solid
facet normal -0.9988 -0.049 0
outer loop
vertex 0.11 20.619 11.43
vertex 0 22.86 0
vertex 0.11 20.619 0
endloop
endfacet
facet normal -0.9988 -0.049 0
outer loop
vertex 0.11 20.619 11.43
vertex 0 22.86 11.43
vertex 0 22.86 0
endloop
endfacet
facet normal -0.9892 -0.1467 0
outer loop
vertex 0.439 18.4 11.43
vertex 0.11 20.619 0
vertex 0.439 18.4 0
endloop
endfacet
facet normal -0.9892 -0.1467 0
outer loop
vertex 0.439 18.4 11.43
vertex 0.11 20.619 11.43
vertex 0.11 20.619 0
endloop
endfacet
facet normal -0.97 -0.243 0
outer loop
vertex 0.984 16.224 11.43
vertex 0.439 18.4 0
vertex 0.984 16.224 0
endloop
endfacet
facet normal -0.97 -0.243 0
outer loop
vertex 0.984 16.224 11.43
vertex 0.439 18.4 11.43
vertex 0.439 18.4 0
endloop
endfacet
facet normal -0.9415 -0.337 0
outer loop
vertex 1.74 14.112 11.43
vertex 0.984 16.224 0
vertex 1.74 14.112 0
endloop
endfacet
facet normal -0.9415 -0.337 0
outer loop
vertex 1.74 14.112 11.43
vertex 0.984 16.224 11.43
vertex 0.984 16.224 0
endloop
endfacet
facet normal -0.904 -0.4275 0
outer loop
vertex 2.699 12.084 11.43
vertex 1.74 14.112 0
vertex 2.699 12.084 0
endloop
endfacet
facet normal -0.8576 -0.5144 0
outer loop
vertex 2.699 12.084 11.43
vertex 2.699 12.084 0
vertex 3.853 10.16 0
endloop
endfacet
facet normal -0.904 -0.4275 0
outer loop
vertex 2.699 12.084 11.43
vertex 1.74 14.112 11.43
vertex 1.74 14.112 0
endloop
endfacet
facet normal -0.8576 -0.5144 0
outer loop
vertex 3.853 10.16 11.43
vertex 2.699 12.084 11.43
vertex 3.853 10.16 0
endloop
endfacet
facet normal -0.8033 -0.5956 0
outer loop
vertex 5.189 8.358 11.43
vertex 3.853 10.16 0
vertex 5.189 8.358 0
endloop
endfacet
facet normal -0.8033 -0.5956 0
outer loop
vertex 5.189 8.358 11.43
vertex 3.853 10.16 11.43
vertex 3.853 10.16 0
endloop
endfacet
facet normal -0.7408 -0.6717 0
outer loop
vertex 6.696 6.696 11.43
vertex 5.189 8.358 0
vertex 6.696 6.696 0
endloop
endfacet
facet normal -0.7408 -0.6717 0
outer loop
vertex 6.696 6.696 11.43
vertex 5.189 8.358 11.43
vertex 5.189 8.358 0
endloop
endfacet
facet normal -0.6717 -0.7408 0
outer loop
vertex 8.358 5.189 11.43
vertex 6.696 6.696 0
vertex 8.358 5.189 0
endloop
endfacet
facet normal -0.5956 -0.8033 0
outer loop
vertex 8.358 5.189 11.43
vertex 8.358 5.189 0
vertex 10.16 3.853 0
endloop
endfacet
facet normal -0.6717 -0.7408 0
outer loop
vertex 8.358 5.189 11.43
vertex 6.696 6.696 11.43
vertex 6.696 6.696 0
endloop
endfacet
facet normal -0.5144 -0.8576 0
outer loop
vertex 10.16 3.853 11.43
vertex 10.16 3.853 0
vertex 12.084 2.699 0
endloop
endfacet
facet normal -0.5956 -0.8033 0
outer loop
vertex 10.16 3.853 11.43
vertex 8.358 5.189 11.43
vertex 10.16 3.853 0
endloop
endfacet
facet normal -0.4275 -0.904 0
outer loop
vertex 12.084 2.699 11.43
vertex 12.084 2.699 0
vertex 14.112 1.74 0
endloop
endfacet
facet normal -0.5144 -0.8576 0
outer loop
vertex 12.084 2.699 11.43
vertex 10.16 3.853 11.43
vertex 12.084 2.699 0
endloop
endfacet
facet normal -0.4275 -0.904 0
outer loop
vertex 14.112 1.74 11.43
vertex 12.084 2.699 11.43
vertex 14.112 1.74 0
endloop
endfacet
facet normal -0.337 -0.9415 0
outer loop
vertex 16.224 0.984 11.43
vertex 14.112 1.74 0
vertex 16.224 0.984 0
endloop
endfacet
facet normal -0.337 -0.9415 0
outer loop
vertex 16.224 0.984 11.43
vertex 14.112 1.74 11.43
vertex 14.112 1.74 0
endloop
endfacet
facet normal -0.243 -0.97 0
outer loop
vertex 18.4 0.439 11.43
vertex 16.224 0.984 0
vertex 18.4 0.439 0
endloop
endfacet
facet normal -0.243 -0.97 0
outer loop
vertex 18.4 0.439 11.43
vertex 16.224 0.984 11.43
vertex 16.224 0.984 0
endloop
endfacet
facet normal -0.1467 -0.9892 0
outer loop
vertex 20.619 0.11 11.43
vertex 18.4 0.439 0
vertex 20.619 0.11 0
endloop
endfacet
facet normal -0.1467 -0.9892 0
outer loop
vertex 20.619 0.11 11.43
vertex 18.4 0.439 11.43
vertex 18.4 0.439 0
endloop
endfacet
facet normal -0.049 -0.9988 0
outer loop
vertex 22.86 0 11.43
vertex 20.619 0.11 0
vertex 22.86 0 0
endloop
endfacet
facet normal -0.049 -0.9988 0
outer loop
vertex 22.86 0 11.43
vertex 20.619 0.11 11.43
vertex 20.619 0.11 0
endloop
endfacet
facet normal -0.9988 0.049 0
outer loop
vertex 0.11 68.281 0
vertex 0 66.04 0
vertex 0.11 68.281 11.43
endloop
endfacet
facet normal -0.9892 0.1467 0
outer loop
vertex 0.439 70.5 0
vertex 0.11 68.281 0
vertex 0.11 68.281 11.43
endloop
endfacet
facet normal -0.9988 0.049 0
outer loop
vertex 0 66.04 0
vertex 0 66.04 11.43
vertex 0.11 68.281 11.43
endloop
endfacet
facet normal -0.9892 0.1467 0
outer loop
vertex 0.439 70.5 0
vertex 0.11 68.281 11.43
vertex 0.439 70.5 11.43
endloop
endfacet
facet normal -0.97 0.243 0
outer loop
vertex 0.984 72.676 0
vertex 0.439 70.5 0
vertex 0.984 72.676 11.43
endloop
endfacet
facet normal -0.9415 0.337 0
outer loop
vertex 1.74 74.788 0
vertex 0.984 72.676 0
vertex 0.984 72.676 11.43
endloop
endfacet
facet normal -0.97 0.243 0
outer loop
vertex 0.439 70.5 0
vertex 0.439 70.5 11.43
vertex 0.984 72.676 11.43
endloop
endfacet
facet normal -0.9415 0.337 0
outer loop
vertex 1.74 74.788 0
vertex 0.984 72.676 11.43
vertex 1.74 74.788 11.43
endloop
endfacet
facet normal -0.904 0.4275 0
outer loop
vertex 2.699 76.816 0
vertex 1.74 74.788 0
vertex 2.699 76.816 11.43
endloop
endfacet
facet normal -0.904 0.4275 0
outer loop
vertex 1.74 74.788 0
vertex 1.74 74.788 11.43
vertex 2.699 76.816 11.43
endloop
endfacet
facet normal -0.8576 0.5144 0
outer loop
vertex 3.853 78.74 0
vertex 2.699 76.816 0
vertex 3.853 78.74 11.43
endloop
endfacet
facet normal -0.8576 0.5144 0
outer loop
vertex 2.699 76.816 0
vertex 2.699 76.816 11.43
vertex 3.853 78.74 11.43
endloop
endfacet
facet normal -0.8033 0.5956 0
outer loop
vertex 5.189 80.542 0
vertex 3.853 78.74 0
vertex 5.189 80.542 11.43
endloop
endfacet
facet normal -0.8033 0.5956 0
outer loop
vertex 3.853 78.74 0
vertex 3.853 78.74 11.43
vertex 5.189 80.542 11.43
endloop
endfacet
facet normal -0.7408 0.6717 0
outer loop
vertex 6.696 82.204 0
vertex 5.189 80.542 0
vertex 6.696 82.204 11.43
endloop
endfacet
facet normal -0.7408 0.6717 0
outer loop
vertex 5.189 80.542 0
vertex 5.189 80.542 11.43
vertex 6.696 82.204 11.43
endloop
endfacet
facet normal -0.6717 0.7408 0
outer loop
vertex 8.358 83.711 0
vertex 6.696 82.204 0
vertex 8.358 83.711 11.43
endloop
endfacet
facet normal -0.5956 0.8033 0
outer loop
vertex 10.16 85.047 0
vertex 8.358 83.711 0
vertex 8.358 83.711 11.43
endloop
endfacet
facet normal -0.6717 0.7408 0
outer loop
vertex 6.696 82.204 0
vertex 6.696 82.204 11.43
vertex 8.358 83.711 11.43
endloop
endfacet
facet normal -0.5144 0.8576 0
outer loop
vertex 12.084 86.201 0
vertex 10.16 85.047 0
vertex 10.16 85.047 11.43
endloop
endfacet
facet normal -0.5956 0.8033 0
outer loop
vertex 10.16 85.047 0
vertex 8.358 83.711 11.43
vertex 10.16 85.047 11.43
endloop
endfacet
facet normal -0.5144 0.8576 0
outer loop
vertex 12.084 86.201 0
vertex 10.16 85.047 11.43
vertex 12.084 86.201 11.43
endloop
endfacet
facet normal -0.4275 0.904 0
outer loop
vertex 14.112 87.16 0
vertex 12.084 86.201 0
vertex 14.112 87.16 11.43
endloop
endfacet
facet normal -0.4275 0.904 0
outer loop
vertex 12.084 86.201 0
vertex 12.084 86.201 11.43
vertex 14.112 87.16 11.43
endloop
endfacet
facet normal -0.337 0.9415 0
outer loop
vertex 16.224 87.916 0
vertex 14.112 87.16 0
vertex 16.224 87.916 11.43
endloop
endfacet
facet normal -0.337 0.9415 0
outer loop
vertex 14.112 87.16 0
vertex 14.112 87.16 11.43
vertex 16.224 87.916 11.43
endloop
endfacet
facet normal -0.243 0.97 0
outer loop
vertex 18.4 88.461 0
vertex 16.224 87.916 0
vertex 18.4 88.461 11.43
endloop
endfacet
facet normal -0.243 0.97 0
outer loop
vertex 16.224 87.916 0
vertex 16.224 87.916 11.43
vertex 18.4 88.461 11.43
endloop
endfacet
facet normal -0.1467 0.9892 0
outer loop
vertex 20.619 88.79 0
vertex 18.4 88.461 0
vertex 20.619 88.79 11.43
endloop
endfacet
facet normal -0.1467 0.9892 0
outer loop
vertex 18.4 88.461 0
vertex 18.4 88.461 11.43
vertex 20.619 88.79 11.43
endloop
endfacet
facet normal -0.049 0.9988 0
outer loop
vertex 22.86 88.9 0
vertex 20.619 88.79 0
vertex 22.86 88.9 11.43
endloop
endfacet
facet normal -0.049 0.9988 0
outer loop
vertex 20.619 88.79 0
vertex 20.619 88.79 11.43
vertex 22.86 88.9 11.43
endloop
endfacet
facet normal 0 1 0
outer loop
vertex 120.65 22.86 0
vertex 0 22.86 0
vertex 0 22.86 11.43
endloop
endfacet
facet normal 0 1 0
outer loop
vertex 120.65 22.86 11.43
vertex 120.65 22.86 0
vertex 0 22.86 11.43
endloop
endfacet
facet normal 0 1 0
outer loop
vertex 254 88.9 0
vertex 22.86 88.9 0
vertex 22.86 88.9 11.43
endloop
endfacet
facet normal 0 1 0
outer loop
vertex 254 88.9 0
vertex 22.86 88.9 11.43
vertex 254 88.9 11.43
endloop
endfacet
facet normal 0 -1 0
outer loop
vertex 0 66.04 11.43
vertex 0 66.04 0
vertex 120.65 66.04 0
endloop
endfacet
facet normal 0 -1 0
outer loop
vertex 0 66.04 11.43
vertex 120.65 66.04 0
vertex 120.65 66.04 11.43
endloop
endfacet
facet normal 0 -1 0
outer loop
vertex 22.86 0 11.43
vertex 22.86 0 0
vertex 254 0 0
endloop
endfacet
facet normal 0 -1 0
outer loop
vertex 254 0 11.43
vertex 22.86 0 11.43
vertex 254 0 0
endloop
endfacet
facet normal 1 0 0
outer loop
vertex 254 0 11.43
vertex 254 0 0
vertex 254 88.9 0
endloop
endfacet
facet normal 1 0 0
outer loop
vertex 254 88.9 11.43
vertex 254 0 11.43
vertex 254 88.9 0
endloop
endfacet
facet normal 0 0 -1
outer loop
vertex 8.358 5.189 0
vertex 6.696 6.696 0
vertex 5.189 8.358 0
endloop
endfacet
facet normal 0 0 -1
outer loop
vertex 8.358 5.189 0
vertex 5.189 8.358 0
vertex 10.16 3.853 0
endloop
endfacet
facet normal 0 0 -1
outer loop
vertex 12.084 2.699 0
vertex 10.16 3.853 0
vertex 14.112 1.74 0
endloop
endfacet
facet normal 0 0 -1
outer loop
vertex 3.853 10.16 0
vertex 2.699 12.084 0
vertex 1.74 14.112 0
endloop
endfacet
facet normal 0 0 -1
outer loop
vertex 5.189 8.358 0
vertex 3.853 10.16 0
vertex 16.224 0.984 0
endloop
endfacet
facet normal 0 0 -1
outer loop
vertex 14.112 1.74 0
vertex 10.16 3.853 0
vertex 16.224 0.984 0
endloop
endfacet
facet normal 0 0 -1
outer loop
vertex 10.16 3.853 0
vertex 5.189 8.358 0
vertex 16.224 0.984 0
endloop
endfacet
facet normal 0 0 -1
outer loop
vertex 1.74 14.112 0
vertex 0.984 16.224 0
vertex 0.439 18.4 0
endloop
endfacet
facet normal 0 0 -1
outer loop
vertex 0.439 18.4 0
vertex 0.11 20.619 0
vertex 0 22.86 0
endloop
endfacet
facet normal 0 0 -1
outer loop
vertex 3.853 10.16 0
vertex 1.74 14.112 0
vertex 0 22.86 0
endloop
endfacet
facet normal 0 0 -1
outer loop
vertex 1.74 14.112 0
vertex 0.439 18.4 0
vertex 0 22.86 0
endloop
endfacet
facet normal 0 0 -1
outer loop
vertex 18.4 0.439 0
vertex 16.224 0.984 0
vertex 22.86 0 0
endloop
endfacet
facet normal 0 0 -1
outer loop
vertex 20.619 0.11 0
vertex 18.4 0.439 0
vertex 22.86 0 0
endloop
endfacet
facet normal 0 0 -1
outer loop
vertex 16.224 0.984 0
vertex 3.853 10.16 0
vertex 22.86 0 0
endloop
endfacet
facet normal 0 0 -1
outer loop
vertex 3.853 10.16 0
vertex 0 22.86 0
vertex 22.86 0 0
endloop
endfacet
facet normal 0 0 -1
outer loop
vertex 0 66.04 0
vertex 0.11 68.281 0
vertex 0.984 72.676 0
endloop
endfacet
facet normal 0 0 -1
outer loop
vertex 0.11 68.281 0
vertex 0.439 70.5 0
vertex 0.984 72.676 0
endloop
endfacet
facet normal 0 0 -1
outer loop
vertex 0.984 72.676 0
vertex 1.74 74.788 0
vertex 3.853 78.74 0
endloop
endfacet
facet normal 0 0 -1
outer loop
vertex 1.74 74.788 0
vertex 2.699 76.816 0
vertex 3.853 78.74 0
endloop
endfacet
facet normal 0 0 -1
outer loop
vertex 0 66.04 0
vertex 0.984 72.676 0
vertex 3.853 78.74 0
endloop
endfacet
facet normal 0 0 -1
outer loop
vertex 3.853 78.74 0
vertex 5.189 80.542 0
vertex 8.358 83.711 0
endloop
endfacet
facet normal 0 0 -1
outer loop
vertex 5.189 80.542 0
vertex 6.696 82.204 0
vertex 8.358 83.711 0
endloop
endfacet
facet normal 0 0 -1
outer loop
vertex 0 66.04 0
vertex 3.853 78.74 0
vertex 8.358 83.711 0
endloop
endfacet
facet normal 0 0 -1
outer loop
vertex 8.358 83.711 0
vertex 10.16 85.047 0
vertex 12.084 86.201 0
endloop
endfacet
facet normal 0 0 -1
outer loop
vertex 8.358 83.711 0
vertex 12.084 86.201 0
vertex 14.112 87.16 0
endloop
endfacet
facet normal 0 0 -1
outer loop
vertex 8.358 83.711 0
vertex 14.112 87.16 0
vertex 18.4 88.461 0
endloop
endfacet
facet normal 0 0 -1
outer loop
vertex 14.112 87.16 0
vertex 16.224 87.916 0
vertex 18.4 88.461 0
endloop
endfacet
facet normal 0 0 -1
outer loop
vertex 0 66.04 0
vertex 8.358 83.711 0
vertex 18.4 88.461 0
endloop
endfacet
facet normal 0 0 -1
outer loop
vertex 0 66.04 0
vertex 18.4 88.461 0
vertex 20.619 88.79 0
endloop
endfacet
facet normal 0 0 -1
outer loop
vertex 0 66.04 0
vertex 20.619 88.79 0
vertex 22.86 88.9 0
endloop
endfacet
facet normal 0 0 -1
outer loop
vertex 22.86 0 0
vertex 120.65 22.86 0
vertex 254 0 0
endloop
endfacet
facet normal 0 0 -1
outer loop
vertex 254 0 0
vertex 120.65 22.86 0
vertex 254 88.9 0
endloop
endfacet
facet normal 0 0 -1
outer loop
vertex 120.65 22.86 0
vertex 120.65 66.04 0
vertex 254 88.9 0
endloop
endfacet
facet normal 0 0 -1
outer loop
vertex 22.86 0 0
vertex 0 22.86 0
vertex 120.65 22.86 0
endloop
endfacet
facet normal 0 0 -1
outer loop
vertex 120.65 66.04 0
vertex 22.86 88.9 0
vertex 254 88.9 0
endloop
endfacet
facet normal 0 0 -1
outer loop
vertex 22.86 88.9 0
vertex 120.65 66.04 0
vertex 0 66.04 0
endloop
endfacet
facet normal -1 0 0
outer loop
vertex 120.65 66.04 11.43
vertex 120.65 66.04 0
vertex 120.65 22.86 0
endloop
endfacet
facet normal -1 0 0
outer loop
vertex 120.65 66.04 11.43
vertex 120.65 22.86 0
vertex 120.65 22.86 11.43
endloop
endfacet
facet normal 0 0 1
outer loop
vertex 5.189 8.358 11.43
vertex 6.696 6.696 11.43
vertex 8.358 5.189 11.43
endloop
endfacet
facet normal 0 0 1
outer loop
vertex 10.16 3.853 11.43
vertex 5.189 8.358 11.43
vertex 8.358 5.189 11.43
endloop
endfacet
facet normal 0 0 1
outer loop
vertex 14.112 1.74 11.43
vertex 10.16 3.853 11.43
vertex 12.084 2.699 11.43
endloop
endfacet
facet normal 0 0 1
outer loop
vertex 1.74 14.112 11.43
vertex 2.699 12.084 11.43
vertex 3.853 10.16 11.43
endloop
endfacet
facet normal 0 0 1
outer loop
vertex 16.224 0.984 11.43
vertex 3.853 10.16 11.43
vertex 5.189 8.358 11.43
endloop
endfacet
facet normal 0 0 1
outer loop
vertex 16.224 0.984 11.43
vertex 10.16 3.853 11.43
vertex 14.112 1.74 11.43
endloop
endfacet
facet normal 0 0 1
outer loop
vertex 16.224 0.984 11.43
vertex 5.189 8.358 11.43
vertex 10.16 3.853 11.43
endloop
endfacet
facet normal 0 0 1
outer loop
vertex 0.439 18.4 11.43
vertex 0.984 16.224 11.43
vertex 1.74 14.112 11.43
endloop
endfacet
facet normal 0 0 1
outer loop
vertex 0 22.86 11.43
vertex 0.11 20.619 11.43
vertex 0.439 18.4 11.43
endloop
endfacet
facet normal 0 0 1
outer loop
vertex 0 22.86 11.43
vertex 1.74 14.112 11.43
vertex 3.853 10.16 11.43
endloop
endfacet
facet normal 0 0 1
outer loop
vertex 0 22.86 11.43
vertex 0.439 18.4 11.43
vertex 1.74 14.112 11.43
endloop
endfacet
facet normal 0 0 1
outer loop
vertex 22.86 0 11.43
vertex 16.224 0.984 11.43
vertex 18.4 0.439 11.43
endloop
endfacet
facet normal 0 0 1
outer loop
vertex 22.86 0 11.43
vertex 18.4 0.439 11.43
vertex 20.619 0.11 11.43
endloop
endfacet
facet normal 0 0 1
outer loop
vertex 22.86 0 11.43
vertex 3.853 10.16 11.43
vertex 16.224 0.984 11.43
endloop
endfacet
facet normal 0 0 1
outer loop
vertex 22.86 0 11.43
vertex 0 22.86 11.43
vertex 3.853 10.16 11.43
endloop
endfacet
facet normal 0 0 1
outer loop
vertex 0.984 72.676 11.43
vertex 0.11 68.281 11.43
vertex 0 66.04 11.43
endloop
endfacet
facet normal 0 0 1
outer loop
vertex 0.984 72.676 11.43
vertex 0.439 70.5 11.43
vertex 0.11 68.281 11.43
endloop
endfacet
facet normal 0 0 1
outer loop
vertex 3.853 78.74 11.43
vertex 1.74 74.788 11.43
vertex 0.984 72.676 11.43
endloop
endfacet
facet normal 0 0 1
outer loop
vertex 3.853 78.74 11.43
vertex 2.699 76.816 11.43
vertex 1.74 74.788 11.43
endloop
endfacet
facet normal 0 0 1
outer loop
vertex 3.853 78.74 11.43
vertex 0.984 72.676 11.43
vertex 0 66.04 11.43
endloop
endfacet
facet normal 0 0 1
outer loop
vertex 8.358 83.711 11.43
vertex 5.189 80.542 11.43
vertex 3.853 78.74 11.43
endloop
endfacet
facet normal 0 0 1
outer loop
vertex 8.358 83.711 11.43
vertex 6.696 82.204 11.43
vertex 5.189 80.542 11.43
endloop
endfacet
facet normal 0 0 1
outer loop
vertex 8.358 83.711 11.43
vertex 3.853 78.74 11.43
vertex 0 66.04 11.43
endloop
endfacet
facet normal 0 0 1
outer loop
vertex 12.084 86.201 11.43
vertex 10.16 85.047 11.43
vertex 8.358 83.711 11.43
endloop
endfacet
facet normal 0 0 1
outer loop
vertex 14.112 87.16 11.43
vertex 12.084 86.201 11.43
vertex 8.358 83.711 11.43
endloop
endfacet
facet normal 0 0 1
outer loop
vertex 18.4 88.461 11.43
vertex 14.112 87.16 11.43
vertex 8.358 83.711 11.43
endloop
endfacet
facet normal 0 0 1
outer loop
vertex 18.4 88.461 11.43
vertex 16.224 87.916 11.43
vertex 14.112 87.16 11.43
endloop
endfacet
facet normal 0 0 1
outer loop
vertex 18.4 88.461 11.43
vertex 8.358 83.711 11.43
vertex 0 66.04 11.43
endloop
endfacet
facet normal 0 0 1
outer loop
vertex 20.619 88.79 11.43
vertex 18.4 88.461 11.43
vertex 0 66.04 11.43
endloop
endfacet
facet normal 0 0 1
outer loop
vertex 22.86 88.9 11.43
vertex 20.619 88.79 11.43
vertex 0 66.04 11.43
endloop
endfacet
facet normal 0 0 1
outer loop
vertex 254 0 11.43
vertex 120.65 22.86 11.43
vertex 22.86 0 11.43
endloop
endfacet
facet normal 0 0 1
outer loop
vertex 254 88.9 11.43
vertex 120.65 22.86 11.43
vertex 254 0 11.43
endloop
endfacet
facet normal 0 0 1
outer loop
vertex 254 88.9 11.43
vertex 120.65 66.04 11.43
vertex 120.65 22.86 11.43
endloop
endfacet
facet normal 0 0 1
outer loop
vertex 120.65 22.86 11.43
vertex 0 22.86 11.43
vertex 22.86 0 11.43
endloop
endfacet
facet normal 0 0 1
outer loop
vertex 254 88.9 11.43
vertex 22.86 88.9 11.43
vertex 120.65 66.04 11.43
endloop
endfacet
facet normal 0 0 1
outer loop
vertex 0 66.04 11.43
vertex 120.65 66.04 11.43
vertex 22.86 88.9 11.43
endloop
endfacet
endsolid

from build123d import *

# Parameters (mm, degrees)
SKETCH1_W           = 254
SKETCH1_H           = 88.9
BOSS_EXTRUDE1_DEPTH = 11.43
FILLET1_R           = 22.86
FILLET2_R           = 22.86
SKETCH2_W           = 11.43
SKETCH2_H           = 43.18
CUT_EXTRUDE1_DEPTH  = 120.65


with BuildPart() as part:
    # Sketch1 → Boss-Extrude1 (new body)
    with BuildSketch(Plane.XY):
        with Locations((127, 44.45)):
            Rectangle(SKETCH1_W, SKETCH1_H)
    extrude(amount=BOSS_EXTRUDE1_DEPTH)

    # Fillet1
    fillet1_edges = [part.edges().sort_by_distance(p)[0] for p in [
        (0, 88.9, 5.715),
    ]]
    fillet(fillet1_edges, radius=FILLET1_R)

    # Fillet2
    fillet2_edges = [part.edges().sort_by_distance(p)[0] for p in [
        (0, 0, 5.715),
    ]]
    fillet(fillet2_edges, radius=FILLET2_R)

    # Sketch2 → Cut-Extrude1 (cut)
    with BuildSketch(Plane.ZY):
        with Locations((5.715, 44.45)):
            Rectangle(SKETCH2_W, SKETCH2_H)
    extrude(amount=-CUT_EXTRUDE1_DEPTH, mode=Mode.SUBTRACT)


solid = part.part
